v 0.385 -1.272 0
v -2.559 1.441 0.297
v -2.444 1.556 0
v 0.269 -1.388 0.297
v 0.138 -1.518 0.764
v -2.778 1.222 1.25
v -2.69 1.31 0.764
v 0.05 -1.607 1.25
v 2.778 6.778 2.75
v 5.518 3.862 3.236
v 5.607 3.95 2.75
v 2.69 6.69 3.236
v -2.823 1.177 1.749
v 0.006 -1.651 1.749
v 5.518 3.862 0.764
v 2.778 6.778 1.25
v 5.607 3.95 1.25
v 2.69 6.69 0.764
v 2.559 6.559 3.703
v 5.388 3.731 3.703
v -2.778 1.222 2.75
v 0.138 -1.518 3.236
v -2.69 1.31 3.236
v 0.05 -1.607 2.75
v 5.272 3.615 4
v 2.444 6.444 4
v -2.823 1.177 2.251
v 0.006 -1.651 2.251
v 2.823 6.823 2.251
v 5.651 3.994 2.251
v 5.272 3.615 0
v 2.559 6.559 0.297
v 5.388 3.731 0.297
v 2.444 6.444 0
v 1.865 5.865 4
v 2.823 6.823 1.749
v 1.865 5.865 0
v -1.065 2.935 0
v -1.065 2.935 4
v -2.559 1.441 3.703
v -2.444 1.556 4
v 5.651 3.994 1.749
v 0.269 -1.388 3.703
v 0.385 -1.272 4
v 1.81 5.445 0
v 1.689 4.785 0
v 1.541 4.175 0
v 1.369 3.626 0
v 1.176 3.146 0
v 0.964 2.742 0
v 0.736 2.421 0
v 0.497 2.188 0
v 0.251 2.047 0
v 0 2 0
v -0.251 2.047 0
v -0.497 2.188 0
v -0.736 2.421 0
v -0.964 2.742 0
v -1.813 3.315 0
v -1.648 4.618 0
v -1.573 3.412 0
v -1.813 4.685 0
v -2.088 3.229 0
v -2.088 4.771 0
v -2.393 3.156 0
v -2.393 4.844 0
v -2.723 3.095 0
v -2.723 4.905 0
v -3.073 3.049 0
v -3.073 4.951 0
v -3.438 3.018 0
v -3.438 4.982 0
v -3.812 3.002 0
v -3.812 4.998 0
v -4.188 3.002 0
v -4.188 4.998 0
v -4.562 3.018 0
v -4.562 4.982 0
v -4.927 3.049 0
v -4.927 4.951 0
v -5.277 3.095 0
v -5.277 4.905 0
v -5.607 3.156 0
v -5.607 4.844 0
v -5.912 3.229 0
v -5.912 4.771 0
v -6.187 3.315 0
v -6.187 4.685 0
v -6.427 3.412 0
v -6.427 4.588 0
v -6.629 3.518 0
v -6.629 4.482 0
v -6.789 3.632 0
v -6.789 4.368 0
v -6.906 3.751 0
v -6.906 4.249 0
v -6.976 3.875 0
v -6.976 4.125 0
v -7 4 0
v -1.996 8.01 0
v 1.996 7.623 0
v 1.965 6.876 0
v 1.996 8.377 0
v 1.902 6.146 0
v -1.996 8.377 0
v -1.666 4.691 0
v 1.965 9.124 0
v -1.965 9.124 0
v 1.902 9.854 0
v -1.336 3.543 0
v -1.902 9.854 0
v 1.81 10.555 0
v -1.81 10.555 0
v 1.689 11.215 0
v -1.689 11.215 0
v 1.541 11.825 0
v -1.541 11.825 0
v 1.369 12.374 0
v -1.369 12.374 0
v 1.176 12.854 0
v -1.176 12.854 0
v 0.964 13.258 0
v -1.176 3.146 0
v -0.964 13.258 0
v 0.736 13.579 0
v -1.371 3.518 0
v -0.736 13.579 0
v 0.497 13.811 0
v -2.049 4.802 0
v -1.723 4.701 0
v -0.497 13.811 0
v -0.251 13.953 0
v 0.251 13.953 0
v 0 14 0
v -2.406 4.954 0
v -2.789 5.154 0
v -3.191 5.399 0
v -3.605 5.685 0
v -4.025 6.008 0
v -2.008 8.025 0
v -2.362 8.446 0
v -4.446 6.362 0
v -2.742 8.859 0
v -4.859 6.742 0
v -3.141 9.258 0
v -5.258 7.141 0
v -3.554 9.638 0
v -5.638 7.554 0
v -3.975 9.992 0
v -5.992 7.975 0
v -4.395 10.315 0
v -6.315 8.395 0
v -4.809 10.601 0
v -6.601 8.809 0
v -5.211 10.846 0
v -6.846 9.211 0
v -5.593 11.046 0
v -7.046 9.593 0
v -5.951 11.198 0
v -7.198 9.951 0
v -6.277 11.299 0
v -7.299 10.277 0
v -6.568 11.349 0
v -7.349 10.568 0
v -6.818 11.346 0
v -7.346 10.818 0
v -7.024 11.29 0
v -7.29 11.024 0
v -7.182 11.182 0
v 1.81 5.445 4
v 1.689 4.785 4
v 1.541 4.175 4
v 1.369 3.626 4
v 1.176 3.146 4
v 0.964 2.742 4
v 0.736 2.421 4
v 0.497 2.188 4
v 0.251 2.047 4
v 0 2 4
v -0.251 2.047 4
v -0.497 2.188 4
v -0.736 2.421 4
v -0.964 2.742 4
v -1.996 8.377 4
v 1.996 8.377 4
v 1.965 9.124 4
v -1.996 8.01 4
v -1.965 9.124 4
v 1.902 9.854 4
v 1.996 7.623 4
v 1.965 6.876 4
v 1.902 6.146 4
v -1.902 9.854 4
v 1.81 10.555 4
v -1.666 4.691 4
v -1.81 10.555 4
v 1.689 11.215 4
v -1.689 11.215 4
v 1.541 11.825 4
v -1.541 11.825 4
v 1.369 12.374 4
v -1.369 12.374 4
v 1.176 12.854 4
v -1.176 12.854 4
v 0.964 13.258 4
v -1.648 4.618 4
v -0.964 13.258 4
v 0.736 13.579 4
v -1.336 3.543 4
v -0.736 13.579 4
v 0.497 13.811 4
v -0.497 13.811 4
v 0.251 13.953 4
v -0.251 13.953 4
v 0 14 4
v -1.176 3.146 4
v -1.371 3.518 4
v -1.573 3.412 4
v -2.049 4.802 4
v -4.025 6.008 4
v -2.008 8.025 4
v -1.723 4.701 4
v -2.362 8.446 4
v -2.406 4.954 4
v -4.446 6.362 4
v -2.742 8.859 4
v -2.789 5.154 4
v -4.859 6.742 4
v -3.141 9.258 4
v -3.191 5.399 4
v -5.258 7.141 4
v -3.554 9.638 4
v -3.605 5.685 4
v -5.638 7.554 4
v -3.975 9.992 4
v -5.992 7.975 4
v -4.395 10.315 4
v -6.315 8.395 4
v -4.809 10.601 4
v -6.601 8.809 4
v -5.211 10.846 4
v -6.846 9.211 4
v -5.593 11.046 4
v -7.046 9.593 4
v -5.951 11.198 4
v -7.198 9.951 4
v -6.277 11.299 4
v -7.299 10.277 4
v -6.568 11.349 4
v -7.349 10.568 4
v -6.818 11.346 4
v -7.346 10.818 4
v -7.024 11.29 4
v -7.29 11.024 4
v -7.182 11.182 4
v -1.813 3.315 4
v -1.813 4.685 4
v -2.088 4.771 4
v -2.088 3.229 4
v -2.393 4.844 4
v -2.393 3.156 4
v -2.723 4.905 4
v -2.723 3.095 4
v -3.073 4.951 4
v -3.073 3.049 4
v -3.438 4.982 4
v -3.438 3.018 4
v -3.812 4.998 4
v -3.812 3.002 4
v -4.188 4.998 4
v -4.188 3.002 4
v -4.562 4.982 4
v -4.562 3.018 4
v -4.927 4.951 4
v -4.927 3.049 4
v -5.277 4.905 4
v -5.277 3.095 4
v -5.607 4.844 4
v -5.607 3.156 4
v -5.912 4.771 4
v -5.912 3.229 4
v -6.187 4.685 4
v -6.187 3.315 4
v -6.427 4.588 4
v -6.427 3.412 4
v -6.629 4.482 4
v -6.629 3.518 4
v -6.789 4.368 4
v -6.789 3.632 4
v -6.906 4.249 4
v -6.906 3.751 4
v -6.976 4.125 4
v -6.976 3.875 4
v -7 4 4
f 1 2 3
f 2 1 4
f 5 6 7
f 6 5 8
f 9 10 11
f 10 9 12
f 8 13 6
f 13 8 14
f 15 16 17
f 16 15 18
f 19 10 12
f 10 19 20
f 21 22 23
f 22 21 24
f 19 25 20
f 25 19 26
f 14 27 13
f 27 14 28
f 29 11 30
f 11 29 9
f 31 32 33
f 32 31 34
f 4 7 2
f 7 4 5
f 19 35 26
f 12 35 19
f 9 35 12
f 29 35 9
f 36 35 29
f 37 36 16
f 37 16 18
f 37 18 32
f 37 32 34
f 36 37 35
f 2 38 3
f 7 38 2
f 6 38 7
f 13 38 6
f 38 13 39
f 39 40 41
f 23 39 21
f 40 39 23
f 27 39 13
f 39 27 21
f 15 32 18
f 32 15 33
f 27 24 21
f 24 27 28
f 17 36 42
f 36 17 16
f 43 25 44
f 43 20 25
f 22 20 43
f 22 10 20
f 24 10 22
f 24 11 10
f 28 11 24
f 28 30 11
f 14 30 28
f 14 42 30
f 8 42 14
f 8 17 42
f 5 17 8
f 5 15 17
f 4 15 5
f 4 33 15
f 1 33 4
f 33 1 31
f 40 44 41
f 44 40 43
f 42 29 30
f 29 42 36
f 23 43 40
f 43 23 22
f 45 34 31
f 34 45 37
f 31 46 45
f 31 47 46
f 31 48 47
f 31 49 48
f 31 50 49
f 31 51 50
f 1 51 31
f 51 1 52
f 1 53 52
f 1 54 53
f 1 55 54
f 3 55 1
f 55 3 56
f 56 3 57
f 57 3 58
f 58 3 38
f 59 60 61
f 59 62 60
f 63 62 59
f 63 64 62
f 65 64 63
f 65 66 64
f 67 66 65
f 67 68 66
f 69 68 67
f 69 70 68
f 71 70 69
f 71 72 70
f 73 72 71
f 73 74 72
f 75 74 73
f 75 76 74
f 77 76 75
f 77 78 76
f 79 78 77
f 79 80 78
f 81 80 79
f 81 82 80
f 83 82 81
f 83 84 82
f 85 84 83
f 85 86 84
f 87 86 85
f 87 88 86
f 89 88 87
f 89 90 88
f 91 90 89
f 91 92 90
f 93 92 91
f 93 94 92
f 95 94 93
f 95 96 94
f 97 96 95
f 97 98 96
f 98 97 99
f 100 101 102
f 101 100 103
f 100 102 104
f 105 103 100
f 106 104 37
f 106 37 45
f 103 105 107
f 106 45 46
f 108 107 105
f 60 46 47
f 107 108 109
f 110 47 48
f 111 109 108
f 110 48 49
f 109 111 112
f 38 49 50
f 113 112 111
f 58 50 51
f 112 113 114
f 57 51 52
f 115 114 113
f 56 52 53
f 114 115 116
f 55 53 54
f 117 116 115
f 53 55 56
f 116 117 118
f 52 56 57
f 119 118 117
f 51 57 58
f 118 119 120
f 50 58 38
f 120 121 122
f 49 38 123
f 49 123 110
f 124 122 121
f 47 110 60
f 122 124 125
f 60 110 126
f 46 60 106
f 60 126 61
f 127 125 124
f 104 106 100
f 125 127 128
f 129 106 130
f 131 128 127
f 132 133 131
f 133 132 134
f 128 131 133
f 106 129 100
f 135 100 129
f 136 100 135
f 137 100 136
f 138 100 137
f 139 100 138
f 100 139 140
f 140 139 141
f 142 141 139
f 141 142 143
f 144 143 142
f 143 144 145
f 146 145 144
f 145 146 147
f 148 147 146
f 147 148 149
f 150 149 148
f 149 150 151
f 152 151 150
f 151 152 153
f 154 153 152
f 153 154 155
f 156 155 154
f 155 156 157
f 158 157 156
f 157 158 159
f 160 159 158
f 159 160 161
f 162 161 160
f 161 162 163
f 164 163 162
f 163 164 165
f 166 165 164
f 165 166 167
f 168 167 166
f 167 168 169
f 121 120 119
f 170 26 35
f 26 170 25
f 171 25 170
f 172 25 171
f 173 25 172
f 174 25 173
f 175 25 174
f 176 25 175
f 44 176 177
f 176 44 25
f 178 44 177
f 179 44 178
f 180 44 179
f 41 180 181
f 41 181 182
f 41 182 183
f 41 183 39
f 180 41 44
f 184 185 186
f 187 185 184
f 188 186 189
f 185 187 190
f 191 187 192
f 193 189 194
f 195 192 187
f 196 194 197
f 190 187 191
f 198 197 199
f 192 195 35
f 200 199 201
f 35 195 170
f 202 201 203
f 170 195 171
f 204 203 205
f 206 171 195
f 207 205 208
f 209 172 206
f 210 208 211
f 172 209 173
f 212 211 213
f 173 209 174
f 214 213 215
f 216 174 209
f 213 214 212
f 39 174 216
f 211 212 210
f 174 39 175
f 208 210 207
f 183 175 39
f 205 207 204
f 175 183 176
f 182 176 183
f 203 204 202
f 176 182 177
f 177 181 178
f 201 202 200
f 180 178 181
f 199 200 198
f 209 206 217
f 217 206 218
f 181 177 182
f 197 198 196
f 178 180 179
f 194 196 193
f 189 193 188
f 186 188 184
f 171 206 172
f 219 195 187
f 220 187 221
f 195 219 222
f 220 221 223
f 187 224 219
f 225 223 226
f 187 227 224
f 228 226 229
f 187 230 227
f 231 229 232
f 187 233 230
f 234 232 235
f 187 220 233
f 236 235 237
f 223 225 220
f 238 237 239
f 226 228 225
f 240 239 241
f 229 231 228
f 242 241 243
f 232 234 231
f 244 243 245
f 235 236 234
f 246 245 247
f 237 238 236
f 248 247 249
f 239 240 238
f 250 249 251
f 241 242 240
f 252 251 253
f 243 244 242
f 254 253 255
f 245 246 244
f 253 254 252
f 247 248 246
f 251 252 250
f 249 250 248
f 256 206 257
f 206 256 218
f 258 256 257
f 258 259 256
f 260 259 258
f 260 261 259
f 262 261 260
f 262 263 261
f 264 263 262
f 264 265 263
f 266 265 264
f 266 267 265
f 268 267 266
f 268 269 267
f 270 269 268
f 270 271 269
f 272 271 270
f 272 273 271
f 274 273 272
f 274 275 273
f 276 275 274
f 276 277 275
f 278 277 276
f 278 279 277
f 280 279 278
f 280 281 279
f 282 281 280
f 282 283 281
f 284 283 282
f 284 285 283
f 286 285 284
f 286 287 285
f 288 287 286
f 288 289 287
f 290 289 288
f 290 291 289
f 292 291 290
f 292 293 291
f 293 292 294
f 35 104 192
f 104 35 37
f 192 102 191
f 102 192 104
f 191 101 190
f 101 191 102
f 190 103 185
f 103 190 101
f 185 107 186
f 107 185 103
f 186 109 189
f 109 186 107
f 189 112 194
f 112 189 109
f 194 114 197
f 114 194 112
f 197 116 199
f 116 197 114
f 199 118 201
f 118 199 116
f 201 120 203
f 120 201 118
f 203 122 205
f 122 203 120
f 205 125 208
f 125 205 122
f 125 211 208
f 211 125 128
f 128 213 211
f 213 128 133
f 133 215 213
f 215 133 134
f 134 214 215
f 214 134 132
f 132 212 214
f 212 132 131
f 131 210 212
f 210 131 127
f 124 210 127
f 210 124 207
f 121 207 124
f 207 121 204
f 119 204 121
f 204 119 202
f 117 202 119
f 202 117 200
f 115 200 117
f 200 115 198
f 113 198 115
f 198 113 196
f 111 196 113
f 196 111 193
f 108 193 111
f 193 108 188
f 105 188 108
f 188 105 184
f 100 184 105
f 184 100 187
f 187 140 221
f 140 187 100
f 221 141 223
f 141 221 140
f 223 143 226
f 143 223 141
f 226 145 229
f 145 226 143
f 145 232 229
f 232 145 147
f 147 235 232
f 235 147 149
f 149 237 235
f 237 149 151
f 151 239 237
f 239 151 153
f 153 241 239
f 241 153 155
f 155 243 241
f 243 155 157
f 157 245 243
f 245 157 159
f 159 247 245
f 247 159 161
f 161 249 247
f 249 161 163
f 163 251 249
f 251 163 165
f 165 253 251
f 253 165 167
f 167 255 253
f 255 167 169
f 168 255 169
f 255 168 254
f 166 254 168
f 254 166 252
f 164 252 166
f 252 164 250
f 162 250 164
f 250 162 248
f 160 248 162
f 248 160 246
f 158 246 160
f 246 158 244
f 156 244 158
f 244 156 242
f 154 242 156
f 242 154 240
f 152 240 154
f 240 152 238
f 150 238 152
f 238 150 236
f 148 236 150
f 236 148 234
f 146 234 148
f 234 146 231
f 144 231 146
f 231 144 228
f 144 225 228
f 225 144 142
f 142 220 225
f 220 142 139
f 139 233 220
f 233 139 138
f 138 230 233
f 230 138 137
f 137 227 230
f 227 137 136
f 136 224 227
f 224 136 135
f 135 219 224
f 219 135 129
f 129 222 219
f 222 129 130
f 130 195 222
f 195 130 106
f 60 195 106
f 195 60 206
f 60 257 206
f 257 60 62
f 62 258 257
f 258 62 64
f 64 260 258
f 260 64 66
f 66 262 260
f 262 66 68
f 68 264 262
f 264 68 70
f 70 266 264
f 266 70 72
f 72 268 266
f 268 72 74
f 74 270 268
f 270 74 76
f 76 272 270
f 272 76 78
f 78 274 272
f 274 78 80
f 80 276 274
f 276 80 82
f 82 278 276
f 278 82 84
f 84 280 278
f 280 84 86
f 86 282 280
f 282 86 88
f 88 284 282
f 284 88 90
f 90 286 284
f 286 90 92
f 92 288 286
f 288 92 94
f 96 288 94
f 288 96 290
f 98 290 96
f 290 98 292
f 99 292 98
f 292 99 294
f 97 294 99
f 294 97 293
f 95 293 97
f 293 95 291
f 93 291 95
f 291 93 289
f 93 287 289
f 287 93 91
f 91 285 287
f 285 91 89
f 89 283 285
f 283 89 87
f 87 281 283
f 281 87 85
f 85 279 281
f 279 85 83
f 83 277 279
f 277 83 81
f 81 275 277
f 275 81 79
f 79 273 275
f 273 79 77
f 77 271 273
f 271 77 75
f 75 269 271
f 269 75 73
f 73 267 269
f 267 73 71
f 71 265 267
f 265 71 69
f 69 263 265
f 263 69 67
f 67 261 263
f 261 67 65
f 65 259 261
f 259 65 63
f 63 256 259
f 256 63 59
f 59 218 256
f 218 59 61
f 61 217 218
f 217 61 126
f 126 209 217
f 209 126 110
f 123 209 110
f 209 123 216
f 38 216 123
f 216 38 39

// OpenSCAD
$fn=50;

module ellipse(diameter) {
    //resize([diameter*1.5,diameter/1.5]) circle(d=diameter);
    scale([1.5,.5])circle(d=diameter);
}

module gruen() {
    linear_extrude(height=4) {
        translate([0,8,0]) rotate([0,0,90]) ellipse(8);
        translate([-4,8,0]) rotate([0,0,-45]) ellipse(6);
        translate([-4,4,0]) rotate([0,0,0]) ellipse(4);
    }
    translate([0,4,2]) rotate([0,90,-45]) difference() {
        translate([0,0,0]) cylinder(r=4,h=4);
        translate([6,0,2]) cube([8,8,4], center=true);
        translate([-6,0,2]) cube([8,8,4],center=true);
    }
}

module moehre() {
    difference() {
        union() {
            cylinder(r1=5.5, r2=6.5, h=2);
            translate([0,0,2]) cylinder(r1=6.5, r2=0.5, h=25);
        }
        cylinder(r=4.2, h=5);
    }
}

module ohr() {
    difference() {
        union() {
            translate([0,0,0]) {
                minkowski() {
                    cube([6,62,4], center=true);
                    cylinder(r=2,h=1);
                }
            }
            translate([5.8,43.4,0]) {
                rotate([0,0,-25]) {
                    difference() {
                        minkowski() {
                            cube([6,28,4], center=true);
                            cylinder(r=2,h=1);
                        }
                        translate([0,12,0]) cube([0.5,10,6], center=true);
                        translate([0,16,0]) rotate([0,0,45]) cube([3,3,6], center=true);
                    }
                }
            }
        }
        translate([0,0,1]) hull() {
            translate([0,0,1]) cube([6,6,2], center=true);
            translate([0,15,0]) cylinder(d=4,h=2);
            translate([0,21,0]) cylinder(d=2,h=2);
        }
        
        translate([0,-40,-2]) {
            hull() {
                translate([0,0,0]) cylinder(d=7.4,h=2);
                translate([0,16.5,0]) cylinder(d=4,h=2);
            }
            //translate([0,0,])cylinder(d=5.2,h=5);
        }
    }
}

module base() {
    difference() {
        translate([0,0,0]) cylinder(r=4,h=4);
        translate([6,0,2]) cube([8,8,4], center=true);
        translate([-6,0,2]) cube([8,8,4],center=true);
    }
}

!gruen();
moehre();
ohr();
base();
